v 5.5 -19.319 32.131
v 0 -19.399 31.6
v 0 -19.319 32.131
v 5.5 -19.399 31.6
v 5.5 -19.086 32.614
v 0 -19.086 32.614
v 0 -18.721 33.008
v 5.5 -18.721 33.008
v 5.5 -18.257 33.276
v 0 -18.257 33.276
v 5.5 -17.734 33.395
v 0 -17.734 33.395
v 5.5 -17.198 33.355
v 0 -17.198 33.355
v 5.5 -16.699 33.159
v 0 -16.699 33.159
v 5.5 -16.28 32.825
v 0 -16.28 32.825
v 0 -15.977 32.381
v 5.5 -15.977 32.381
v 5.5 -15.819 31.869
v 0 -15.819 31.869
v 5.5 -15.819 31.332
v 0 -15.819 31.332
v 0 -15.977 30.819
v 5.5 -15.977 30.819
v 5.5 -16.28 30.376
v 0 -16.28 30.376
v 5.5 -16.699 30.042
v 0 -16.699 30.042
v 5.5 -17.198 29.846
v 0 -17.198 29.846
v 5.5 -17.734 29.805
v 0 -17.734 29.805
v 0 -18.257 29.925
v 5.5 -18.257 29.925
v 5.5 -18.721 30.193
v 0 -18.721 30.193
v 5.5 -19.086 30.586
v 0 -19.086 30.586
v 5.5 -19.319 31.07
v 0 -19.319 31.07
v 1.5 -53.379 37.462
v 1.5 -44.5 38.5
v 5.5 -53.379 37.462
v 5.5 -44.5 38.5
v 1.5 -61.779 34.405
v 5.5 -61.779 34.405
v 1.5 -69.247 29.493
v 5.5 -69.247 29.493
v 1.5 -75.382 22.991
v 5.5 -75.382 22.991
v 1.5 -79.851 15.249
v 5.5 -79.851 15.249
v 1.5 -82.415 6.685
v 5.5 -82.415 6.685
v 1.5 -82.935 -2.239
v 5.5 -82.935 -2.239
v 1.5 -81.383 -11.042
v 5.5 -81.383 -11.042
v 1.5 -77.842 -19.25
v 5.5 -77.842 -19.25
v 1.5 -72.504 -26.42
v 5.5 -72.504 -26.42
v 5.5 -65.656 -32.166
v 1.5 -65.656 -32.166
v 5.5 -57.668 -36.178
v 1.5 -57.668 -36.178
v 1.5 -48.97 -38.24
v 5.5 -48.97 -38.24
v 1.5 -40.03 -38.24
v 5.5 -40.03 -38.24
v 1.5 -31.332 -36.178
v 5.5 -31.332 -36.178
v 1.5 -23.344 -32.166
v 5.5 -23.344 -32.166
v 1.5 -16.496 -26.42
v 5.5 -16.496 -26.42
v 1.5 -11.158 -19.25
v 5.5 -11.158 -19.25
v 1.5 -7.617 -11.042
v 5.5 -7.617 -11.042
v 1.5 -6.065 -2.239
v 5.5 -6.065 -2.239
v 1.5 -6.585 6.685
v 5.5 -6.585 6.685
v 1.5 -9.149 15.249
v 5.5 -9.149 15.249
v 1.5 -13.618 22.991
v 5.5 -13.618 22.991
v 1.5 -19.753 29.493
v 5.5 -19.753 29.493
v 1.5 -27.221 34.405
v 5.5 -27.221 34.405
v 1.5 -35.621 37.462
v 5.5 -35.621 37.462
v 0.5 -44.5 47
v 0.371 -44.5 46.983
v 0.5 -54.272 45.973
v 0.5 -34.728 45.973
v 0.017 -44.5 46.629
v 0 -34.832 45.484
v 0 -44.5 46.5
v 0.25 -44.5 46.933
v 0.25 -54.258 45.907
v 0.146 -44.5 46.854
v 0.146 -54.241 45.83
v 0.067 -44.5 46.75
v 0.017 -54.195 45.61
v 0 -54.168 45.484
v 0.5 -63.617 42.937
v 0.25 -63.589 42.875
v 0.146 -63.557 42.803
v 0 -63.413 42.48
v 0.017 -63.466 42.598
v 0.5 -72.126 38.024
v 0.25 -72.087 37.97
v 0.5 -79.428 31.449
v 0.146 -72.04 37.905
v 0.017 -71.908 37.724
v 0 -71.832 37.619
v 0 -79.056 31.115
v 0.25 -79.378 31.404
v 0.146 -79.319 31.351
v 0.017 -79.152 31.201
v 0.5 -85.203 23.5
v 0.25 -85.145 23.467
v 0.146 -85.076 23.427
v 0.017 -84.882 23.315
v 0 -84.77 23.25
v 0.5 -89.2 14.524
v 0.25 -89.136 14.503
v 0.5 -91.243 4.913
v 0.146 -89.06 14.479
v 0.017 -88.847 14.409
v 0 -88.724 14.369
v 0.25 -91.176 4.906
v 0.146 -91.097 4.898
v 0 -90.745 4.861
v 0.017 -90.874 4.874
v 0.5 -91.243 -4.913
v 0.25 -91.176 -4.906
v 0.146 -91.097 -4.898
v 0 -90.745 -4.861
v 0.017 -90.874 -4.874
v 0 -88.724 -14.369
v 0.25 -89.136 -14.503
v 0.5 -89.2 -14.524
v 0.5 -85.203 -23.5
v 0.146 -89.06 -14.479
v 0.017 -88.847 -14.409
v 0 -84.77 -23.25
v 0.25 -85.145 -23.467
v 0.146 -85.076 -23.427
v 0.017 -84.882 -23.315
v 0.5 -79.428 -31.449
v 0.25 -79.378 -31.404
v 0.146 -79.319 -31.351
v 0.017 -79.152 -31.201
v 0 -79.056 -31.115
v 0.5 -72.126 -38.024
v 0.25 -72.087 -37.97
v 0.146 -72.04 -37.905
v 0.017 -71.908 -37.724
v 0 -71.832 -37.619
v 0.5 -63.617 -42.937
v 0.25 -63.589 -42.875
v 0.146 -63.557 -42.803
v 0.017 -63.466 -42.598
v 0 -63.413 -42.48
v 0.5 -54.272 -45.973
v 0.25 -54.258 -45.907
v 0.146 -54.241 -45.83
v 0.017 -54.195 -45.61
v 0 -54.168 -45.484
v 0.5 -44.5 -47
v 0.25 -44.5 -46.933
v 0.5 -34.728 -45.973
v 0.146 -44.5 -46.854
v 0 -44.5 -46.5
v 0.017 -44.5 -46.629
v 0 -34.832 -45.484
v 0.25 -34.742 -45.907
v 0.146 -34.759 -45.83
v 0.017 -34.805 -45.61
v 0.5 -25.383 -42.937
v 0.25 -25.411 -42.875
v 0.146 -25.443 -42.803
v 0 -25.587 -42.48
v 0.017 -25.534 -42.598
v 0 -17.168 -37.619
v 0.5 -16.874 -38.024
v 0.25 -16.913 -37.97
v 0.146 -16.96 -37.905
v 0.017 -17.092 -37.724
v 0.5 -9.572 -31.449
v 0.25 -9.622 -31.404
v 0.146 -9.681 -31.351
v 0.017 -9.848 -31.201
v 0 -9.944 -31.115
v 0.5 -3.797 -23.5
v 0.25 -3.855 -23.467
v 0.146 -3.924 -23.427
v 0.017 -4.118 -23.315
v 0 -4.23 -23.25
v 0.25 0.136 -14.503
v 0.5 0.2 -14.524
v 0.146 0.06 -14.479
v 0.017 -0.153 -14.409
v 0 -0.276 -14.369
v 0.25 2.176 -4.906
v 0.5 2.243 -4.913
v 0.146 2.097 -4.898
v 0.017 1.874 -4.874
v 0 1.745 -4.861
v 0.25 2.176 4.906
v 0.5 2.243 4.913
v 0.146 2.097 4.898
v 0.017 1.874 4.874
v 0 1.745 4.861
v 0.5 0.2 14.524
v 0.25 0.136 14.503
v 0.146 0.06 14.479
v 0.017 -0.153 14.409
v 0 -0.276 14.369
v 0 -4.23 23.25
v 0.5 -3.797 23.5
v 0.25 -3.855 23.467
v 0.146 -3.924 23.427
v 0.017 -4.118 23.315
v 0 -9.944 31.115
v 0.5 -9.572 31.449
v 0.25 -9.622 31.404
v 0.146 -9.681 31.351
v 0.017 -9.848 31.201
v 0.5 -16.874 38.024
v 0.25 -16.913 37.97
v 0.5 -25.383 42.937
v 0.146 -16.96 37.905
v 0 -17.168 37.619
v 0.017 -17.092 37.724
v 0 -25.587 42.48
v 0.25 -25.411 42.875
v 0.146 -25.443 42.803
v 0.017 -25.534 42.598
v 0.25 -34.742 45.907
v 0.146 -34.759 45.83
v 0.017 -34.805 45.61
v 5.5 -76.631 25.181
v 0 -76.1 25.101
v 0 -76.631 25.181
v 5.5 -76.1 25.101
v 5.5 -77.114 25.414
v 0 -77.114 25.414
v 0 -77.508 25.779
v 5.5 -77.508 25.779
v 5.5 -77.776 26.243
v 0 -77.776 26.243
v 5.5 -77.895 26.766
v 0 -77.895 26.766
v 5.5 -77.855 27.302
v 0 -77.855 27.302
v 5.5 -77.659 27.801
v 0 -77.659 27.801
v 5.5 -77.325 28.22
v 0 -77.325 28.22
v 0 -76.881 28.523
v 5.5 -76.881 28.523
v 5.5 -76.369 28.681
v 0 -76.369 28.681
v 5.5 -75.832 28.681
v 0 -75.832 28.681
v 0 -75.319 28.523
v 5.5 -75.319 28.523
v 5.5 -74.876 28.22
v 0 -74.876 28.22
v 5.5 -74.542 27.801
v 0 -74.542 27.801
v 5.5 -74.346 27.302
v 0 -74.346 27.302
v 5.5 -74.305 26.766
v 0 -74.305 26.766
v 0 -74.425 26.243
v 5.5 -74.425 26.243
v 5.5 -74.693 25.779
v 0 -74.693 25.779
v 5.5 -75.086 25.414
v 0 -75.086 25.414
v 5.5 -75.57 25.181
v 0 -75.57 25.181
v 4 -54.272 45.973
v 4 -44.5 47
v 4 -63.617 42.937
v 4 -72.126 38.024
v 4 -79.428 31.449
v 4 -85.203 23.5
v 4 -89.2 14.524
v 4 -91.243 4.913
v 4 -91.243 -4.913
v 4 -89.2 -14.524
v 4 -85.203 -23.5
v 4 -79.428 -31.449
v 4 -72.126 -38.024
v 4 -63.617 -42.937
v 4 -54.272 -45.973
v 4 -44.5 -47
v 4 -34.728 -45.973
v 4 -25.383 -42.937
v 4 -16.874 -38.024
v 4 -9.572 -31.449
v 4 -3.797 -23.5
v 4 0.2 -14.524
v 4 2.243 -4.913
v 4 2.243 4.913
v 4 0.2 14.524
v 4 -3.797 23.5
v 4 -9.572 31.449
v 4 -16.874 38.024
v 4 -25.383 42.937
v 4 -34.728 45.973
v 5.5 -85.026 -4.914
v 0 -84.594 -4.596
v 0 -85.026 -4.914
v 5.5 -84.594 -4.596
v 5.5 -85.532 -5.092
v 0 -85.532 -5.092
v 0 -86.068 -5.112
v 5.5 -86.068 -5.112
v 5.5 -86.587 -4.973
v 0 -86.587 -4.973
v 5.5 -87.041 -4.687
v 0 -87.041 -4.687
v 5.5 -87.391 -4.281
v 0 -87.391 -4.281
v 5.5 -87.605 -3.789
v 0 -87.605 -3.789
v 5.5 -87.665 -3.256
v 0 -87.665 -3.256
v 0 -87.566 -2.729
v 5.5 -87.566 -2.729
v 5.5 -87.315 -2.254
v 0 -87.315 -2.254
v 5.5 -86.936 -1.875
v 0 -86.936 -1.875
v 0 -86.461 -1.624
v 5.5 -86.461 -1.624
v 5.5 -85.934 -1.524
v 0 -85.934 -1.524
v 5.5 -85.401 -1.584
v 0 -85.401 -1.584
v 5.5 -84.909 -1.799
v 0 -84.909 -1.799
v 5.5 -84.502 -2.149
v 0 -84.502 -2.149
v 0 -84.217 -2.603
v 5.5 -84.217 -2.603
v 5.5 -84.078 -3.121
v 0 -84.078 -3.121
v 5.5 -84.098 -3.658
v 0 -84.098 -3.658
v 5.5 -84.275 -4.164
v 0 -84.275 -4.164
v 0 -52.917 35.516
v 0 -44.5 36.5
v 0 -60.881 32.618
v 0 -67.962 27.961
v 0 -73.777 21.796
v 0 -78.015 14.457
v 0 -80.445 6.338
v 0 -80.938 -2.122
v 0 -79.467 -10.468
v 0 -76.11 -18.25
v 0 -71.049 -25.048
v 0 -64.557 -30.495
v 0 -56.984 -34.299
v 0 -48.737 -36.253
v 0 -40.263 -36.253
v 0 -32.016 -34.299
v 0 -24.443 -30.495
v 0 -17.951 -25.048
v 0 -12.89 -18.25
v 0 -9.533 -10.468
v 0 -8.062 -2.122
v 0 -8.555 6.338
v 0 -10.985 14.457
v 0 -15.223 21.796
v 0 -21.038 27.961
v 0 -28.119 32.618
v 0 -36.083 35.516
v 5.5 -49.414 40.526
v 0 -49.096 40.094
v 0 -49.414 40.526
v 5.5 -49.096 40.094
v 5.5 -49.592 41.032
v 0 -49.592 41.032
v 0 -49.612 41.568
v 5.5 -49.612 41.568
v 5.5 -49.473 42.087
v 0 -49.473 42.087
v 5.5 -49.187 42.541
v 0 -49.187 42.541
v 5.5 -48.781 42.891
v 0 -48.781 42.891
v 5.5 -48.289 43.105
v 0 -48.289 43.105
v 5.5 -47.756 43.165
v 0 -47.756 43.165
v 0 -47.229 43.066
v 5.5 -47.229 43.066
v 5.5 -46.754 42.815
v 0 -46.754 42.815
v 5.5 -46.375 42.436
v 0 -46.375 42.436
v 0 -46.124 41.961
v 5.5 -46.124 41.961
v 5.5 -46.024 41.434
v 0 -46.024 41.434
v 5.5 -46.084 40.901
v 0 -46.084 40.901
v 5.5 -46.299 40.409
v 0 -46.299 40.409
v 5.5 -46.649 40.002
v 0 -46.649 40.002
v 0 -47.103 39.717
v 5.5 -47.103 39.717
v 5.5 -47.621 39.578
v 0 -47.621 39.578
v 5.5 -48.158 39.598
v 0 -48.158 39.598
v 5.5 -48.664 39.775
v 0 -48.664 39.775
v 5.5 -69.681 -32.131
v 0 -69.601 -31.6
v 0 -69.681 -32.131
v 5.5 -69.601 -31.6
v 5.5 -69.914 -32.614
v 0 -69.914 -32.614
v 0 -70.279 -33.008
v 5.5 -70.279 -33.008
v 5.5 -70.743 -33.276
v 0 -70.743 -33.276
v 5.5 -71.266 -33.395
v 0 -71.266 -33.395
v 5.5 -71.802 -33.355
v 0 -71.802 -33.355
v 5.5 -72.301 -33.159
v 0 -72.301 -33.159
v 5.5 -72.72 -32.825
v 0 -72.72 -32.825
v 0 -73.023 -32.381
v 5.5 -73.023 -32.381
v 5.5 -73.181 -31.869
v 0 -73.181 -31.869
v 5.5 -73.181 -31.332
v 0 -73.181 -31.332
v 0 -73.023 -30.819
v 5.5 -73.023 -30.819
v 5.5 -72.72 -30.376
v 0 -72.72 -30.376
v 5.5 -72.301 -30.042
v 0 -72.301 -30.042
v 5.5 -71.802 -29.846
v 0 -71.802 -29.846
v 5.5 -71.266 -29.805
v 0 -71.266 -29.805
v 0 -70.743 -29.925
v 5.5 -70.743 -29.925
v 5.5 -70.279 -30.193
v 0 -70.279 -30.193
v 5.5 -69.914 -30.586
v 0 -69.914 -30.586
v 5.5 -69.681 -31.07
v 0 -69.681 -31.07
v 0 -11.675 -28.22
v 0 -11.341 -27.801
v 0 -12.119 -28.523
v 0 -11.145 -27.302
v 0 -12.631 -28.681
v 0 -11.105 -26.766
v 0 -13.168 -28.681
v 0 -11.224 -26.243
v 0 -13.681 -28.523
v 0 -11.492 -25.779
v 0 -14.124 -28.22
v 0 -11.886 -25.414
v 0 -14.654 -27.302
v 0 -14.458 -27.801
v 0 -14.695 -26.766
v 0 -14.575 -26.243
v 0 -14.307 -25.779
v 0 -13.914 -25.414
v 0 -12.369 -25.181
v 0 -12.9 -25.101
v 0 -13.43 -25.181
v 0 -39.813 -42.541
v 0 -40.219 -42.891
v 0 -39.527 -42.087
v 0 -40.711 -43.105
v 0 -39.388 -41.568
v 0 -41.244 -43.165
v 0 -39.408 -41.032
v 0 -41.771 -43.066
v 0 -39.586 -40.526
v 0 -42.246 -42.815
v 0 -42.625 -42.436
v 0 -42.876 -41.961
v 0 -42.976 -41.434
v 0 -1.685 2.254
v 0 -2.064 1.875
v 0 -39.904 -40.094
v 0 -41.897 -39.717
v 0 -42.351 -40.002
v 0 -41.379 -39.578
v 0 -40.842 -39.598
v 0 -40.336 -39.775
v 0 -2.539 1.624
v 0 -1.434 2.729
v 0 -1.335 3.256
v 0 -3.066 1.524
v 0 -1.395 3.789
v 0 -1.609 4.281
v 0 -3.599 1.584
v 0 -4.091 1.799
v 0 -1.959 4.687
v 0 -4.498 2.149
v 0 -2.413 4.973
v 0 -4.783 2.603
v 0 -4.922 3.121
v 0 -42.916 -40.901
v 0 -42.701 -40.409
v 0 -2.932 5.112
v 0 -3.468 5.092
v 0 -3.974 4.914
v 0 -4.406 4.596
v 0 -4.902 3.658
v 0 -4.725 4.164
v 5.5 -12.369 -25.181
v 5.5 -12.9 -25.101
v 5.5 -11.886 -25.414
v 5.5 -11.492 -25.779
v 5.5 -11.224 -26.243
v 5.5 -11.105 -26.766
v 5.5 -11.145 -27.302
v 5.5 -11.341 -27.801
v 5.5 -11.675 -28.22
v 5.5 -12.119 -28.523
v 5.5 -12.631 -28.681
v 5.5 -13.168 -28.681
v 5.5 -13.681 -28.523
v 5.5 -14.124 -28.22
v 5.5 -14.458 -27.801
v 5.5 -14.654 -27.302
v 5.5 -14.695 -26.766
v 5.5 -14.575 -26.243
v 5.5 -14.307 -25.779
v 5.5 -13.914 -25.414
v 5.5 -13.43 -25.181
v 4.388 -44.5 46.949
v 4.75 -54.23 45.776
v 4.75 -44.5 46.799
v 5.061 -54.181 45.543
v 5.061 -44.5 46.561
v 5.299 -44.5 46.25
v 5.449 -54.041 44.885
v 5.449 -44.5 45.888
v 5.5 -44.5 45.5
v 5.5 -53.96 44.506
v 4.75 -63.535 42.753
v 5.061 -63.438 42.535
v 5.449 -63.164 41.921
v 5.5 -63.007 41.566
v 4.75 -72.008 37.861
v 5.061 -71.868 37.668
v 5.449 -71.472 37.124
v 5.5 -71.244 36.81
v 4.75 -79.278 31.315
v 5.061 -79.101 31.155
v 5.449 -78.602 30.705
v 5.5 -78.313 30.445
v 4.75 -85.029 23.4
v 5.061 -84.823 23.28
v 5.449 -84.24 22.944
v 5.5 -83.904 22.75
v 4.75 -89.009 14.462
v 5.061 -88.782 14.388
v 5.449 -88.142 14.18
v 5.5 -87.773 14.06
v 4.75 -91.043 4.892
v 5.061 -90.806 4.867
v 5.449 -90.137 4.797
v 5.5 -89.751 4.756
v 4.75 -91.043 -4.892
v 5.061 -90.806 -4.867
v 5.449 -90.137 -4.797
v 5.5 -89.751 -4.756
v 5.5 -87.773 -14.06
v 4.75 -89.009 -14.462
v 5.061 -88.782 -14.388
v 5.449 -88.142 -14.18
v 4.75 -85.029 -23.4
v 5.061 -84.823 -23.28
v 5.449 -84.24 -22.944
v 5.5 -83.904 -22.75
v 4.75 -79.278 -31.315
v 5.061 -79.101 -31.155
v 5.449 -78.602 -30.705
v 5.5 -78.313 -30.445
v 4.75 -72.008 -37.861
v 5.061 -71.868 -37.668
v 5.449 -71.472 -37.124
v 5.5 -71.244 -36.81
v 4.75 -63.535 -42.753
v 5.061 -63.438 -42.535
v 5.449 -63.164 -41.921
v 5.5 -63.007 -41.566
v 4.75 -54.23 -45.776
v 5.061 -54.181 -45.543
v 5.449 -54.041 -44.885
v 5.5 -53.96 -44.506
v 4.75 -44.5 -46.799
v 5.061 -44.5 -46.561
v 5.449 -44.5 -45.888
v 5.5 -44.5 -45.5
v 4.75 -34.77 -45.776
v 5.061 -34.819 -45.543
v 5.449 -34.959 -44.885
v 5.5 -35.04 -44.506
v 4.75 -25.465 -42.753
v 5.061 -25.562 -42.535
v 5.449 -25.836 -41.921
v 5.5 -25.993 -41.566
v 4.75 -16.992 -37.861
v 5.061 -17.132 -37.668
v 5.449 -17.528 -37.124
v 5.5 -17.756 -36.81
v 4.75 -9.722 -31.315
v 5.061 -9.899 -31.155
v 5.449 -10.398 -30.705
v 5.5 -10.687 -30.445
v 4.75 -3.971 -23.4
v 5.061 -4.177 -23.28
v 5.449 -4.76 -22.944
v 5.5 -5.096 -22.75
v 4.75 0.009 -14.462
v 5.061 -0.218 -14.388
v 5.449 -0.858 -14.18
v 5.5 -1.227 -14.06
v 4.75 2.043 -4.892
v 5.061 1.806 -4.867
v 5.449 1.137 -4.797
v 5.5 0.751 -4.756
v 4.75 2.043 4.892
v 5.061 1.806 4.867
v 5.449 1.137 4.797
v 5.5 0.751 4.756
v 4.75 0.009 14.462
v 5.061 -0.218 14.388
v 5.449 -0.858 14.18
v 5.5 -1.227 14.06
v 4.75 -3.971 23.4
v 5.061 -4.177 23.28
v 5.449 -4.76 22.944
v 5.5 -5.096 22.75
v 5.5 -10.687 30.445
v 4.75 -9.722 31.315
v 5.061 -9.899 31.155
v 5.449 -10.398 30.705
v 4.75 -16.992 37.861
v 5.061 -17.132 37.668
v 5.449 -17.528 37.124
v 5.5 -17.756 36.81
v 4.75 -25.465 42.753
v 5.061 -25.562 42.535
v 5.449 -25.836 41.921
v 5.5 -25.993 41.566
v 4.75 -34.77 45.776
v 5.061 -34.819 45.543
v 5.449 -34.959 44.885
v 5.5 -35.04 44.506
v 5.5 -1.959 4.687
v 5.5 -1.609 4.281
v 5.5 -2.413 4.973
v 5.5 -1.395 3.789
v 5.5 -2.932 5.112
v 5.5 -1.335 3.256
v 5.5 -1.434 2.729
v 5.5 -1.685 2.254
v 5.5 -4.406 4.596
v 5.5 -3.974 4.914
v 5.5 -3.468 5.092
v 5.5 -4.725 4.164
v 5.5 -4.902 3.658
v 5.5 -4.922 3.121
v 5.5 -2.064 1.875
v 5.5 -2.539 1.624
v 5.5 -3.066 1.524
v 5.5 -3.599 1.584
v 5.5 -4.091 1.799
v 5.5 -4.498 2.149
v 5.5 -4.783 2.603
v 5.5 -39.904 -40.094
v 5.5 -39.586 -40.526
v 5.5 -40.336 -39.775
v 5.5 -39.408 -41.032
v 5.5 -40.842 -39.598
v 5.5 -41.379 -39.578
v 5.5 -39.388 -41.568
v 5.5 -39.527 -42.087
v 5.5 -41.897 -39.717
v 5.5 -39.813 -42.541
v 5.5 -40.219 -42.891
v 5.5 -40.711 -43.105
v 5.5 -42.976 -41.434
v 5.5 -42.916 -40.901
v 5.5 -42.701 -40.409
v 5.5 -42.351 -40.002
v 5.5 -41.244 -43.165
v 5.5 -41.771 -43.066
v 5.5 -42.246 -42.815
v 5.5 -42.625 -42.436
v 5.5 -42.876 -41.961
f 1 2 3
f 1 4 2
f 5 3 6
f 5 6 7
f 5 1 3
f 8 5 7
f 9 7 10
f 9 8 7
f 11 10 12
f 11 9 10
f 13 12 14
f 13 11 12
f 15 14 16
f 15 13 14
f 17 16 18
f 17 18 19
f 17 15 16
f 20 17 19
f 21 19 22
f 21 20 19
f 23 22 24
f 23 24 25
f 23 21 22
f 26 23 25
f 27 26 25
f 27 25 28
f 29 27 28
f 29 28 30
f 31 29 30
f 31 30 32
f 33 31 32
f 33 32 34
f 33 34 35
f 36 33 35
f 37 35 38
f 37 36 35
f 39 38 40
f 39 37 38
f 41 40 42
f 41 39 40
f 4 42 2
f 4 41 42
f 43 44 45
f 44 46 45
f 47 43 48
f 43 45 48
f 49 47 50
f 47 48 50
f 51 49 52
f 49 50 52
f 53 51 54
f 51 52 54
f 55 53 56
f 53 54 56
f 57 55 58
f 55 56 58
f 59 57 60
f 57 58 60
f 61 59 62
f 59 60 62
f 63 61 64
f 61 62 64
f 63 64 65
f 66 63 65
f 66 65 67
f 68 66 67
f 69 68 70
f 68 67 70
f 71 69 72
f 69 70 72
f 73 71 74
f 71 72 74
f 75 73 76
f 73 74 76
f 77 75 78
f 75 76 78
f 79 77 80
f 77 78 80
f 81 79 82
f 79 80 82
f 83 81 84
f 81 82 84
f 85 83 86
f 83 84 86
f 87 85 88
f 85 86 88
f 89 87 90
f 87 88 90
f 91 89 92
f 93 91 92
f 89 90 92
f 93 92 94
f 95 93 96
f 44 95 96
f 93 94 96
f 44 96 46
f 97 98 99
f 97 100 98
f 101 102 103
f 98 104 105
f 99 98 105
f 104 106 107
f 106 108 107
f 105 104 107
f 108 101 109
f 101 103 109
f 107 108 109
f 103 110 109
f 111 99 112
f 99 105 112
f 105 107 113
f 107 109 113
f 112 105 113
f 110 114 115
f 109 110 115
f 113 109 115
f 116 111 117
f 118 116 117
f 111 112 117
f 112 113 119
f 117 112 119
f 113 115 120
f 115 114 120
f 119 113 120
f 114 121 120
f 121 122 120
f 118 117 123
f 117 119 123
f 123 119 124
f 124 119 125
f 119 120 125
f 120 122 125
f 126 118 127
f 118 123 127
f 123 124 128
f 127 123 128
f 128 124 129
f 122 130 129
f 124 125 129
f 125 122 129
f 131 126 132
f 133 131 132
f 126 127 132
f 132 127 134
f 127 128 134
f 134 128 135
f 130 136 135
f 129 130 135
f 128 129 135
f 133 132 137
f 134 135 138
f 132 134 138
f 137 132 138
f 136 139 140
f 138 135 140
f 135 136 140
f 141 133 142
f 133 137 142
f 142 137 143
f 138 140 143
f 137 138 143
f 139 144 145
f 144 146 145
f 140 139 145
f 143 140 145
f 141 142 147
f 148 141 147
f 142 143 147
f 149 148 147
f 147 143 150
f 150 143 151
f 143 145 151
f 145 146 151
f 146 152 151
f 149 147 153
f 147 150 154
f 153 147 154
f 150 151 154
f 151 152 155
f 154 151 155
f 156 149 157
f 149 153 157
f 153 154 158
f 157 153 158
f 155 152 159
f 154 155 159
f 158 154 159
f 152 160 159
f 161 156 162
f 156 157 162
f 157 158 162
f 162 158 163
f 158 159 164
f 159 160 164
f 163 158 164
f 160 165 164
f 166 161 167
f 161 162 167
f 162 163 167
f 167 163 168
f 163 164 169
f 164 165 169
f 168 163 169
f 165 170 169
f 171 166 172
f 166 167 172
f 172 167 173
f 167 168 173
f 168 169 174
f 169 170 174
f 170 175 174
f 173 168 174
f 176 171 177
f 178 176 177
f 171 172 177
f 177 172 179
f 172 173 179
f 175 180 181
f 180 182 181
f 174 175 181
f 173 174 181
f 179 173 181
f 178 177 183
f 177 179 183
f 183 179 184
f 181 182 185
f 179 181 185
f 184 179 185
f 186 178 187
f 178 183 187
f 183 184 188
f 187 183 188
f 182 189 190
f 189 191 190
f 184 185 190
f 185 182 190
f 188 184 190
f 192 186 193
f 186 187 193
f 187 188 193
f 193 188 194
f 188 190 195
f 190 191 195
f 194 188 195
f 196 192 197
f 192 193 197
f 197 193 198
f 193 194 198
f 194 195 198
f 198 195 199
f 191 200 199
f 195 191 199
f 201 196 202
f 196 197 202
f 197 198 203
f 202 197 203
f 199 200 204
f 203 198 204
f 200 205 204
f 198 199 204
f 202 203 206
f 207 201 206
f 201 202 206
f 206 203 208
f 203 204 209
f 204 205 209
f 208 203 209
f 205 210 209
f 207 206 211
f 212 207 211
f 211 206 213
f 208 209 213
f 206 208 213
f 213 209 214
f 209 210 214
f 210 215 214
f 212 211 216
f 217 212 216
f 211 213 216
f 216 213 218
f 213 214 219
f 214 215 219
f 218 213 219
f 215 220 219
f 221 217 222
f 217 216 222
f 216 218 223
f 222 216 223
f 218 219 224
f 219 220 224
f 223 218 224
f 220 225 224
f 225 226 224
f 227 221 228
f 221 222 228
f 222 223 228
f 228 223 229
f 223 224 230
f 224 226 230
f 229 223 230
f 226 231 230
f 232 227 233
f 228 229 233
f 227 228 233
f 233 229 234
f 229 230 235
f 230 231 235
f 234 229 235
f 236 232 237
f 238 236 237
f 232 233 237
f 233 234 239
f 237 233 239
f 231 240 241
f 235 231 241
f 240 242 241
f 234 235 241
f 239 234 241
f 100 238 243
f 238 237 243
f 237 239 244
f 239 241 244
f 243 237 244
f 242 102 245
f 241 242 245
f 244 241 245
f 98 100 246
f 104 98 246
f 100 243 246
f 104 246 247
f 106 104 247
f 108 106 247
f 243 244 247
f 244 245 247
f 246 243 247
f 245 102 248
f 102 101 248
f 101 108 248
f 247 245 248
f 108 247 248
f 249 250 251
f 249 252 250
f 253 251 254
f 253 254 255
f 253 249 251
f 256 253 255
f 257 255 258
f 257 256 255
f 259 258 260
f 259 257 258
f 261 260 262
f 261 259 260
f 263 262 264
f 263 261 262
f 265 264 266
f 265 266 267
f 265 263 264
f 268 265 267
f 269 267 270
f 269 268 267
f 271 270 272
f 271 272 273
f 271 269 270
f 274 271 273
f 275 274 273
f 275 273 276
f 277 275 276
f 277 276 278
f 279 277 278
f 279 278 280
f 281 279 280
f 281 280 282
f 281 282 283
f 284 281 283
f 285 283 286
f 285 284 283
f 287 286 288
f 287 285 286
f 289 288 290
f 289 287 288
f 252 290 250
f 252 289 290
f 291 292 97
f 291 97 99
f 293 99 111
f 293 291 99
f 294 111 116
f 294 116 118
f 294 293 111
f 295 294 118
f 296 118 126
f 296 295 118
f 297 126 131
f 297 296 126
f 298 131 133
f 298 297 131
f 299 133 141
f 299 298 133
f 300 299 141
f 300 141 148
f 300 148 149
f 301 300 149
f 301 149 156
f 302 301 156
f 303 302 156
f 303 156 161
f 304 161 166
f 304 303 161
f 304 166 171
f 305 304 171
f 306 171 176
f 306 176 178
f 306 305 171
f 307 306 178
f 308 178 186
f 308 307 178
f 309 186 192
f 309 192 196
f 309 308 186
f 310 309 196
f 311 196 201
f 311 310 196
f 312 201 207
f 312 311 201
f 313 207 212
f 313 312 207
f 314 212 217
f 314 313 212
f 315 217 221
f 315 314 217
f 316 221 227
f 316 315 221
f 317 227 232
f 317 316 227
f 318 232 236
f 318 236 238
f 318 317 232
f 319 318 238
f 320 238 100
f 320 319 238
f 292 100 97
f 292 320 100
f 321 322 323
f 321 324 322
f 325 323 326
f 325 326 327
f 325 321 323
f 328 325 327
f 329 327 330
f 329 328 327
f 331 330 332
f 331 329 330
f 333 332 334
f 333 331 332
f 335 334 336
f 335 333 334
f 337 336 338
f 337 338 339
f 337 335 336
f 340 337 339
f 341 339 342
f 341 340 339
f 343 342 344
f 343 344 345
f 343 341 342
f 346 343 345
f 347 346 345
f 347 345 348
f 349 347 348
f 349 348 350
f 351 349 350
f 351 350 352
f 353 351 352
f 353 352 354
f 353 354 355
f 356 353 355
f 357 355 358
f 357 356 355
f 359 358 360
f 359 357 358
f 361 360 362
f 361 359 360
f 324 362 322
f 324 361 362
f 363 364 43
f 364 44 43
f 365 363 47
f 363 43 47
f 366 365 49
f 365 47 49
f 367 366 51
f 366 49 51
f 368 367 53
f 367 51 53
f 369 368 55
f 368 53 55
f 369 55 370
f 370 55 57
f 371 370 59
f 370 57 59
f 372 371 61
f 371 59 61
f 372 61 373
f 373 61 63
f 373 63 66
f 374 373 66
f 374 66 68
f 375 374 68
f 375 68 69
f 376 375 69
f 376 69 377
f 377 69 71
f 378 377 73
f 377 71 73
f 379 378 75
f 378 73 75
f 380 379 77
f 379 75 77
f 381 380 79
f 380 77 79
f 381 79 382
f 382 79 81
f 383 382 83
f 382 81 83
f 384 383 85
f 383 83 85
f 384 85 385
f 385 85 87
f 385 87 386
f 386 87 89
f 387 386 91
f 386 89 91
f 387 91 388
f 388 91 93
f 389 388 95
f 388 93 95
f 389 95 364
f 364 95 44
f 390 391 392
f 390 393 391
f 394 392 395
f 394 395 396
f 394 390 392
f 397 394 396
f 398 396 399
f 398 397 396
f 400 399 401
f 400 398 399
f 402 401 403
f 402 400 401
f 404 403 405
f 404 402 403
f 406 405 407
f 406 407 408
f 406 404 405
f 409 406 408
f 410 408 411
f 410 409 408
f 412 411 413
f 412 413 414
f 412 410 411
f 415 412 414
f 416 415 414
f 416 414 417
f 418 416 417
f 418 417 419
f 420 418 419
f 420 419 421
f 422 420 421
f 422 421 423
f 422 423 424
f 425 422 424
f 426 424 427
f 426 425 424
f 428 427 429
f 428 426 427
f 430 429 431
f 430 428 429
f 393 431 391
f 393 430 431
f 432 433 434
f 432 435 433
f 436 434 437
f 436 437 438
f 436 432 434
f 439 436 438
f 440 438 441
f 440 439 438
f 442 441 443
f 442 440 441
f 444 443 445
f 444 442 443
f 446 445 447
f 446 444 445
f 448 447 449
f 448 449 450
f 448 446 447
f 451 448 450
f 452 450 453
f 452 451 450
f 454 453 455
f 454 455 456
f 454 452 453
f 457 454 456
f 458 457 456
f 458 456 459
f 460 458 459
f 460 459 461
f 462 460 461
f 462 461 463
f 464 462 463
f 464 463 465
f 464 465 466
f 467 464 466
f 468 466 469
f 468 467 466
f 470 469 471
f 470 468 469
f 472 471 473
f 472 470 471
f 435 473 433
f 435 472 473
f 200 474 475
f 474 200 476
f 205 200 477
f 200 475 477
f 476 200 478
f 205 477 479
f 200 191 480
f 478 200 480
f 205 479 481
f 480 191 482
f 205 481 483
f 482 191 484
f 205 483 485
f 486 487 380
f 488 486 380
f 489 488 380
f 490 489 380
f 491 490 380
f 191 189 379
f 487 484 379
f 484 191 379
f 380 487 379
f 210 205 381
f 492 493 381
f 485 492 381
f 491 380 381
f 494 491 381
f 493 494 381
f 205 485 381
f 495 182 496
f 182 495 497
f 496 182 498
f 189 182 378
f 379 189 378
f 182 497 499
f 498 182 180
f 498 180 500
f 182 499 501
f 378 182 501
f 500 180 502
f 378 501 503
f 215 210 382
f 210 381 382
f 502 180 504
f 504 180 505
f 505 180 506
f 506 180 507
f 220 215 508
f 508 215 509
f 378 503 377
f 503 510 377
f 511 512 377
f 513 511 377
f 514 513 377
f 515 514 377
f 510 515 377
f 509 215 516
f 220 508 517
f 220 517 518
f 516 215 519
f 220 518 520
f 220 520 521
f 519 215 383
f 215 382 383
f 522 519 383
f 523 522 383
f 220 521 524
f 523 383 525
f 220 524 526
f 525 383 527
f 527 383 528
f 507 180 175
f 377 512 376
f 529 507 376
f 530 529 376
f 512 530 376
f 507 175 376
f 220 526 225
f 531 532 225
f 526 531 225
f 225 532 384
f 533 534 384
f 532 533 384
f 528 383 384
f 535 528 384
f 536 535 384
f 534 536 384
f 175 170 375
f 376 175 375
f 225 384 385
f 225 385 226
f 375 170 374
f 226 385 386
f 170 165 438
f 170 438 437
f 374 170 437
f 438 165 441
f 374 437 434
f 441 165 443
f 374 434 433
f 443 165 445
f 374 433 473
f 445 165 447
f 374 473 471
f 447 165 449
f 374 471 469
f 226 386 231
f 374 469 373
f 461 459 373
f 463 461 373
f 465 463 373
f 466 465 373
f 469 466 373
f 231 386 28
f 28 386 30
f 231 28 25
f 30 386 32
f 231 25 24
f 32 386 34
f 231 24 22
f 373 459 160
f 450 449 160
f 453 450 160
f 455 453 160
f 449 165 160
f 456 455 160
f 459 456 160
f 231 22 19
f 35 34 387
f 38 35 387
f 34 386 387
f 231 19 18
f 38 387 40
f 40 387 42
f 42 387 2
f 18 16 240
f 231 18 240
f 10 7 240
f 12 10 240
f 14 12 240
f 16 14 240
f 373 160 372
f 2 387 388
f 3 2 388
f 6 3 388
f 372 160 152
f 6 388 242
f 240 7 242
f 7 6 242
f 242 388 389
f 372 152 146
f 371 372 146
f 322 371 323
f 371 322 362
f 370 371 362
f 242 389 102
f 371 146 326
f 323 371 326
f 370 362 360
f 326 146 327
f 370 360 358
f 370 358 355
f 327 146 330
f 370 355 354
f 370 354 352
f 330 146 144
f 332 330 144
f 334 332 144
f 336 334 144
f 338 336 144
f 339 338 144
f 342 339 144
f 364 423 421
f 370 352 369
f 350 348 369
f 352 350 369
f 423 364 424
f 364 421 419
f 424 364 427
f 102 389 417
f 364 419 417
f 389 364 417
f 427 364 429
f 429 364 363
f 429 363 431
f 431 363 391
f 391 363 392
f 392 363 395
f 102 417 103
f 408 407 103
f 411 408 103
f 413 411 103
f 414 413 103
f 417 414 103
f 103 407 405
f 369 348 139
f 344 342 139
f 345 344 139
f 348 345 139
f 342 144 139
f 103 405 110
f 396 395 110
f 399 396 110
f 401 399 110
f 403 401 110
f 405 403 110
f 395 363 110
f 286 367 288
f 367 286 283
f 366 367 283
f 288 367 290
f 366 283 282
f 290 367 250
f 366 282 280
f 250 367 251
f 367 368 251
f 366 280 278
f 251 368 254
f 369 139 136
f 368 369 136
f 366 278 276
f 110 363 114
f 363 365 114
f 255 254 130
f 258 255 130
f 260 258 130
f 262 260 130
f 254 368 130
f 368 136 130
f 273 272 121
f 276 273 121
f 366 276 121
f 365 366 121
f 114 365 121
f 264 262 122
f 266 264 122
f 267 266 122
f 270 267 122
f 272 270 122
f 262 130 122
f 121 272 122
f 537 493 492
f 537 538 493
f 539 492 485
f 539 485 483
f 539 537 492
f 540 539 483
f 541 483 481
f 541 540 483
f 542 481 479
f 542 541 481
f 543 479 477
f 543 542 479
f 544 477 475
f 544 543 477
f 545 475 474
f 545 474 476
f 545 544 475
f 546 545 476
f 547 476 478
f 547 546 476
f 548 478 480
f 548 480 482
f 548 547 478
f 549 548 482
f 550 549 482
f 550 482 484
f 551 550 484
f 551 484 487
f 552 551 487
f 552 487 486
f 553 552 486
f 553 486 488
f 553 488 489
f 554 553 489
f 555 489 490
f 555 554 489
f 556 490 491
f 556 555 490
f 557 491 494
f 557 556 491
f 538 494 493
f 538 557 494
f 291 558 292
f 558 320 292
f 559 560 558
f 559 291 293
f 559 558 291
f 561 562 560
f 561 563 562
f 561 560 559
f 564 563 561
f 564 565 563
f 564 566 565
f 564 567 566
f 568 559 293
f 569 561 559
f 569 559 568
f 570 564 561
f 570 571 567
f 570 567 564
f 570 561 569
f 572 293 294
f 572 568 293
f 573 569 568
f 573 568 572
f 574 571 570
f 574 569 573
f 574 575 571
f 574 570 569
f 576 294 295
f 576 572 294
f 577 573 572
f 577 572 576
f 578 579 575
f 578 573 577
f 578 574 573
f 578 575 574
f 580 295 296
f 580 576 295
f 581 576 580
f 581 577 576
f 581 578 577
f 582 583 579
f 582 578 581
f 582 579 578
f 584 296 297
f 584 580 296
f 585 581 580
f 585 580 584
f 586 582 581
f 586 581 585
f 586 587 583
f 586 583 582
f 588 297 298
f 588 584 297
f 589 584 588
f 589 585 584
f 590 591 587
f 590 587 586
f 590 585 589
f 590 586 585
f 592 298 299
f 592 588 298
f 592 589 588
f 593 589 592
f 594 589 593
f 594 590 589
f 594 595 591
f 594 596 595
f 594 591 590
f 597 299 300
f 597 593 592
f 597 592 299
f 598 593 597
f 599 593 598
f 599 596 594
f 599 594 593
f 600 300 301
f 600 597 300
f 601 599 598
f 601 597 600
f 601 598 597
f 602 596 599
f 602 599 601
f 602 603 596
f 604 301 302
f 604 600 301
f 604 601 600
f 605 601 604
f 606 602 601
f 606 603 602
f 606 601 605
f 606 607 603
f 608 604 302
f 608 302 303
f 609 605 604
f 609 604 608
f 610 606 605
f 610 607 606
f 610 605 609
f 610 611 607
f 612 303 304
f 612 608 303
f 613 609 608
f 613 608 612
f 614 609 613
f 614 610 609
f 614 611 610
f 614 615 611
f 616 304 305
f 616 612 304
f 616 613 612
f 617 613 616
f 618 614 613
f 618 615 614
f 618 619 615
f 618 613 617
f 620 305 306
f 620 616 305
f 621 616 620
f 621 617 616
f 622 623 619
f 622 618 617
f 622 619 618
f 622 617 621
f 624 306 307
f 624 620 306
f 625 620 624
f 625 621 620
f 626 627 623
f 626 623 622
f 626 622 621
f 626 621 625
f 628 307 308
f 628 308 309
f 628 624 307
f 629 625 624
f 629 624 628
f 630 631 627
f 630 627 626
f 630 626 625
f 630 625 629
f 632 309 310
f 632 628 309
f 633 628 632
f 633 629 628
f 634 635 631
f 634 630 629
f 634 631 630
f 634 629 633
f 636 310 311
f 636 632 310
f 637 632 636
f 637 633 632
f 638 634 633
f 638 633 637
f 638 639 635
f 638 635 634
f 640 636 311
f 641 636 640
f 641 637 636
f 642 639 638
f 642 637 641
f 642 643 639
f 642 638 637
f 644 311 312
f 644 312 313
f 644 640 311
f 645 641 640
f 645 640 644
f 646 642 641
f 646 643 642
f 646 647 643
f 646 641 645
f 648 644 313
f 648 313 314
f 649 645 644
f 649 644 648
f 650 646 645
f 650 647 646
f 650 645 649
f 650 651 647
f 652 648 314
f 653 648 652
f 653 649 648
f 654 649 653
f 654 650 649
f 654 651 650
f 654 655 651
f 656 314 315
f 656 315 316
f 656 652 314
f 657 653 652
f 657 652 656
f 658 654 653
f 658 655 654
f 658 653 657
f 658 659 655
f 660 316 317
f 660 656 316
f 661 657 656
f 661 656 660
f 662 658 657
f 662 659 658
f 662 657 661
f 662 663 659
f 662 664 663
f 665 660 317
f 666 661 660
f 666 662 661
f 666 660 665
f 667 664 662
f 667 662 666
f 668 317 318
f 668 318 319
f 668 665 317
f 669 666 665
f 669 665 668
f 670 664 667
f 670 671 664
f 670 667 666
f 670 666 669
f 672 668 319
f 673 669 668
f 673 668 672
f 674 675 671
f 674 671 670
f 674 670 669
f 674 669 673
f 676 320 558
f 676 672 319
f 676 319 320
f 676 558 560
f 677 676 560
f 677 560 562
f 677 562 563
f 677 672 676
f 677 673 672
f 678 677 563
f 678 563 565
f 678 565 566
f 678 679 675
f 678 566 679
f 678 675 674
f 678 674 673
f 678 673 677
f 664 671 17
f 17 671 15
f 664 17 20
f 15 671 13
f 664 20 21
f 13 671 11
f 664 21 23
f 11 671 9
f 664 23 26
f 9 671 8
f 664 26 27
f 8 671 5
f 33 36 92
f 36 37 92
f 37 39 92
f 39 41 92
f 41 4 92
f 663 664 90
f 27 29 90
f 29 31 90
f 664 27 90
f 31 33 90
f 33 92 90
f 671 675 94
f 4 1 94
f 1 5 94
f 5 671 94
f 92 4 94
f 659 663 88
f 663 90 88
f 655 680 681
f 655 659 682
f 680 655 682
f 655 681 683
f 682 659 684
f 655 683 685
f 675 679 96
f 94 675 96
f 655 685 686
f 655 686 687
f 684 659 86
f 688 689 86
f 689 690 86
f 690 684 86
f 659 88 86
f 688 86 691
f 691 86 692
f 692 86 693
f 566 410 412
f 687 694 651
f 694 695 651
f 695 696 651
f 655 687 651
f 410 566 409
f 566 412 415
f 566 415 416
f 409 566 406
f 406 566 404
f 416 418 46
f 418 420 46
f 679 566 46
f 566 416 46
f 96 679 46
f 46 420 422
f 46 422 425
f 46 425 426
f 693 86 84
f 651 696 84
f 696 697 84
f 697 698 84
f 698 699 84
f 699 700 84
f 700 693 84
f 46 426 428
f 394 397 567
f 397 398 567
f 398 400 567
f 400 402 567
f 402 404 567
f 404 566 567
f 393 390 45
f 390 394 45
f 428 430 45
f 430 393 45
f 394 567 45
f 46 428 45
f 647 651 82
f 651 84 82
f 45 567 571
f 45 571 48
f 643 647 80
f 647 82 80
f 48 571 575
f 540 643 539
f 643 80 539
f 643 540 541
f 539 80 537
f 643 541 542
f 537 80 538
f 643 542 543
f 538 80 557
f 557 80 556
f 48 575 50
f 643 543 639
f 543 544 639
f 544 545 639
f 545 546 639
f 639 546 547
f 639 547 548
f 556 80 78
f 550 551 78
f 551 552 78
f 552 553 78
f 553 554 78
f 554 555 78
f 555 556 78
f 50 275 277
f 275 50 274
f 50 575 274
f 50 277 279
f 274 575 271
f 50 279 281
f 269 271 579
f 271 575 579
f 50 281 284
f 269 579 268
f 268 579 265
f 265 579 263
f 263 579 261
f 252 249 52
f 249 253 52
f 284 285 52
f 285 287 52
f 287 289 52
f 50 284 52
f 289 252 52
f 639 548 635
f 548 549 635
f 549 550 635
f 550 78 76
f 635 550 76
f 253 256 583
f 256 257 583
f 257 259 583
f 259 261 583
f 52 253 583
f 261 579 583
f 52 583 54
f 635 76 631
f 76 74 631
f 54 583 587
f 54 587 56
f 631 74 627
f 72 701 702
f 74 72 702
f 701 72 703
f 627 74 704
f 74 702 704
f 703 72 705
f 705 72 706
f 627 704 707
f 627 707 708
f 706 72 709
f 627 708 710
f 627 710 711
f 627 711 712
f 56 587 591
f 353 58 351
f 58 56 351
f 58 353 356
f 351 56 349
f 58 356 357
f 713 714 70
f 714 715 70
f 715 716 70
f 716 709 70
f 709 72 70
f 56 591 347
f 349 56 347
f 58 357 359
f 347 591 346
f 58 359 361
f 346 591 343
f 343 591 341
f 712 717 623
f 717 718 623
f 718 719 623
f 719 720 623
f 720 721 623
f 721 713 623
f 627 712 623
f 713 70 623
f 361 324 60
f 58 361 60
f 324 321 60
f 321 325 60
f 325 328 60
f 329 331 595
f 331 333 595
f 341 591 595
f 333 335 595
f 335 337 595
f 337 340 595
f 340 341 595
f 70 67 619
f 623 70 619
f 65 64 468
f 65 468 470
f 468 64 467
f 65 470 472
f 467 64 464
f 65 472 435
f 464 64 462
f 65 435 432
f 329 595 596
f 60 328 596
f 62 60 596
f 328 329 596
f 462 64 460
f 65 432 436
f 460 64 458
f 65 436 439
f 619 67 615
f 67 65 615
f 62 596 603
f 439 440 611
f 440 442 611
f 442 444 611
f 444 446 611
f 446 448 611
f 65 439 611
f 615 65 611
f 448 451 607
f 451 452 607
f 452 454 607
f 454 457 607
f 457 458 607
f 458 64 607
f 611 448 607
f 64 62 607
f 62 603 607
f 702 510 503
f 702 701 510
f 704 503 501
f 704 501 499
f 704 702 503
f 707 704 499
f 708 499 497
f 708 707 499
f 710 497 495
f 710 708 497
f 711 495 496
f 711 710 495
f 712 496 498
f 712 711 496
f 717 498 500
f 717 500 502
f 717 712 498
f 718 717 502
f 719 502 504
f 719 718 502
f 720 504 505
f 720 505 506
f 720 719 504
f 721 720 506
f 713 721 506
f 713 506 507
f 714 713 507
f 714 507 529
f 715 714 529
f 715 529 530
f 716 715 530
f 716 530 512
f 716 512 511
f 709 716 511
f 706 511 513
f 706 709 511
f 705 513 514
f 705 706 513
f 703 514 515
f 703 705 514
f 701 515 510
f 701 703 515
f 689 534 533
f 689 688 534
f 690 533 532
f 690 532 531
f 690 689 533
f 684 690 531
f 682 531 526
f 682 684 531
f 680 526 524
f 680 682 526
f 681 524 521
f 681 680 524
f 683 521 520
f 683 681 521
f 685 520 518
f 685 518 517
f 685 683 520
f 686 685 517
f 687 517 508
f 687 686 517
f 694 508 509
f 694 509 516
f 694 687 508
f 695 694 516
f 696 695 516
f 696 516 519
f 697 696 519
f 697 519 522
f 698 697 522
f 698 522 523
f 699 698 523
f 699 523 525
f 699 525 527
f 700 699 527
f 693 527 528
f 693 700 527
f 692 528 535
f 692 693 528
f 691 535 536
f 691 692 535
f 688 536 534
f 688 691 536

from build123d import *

# Parameters (mm, degrees)
SKETCH1_W         = 5.5
SKETCH1_H         = 6
SKETCH1_H_2       = 2.5
CIRPATTERN1_COUNT = 8
FILLET1_R         = 1.5
FILLET2_R         = 0.5


with BuildPart() as part:
    # Sketch1 → Revolve1 (revolve)
    with BuildSketch(Plane.XY, mode=Mode.PRIVATE) as revolve1_sk:
        with Locations((2.75, -3)):
            Rectangle(SKETCH1_W, SKETCH1_H)
        Polygon((1.5, -6), (0, -6), (0, -8), align=None)
        with Locations((2.75, 1.25)):
            Rectangle(SKETCH1_W, SKETCH1_H_2)
    revolve(revolve1_sk.sketch.rotate(Axis((-1000, -44.5, 0), (1, 0, 0)), 90), axis=Axis((-1000, -44.5, 0), (1, 0, 0)))

    # Sketch6 → M3 Clearance Hole3 (revolve, cut)
    with BuildSketch(Plane(origin=(5.5, -76.100440255, 26.900969791), x_dir=(0, 0, -1), z_dir=(0, 1, 0))):
        Polygon((0, 0), (0, 6.581549114), (1.8, 5.5), (1.8, 0), align=None)
    m3_clearance_hole3 = revolve(axis=Axis((11.85, -76.100440255, 26.900969791), (-1, 0, 0)), mode=Mode.SUBTRACT)

    # CirPattern1: M3 Clearance Hole3 ×8 about axis
    cirpattern1_axis = Axis((0, -44.5, 0), (1, 0, 0))
    for i in range(1, CIRPATTERN1_COUNT):
        add(m3_clearance_hole3.rotate(cirpattern1_axis, i * 360 / CIRPATTERN1_COUNT), mode=Mode.SUBTRACT)

    # Fillet1
    fillet1_edges = [part.edges().sort_by_distance(p)[0] for p in [
        (5.5, -44.5, -47),
    ]]
    fillet(fillet1_edges, radius=FILLET1_R)

    # Fillet2
    fillet2_edges = [part.edges().sort_by_distance(p)[0] for p in [
        (0, -44.5, -47),
    ]]
    fillet(fillet2_edges, radius=FILLET2_R)


solid = part.part
